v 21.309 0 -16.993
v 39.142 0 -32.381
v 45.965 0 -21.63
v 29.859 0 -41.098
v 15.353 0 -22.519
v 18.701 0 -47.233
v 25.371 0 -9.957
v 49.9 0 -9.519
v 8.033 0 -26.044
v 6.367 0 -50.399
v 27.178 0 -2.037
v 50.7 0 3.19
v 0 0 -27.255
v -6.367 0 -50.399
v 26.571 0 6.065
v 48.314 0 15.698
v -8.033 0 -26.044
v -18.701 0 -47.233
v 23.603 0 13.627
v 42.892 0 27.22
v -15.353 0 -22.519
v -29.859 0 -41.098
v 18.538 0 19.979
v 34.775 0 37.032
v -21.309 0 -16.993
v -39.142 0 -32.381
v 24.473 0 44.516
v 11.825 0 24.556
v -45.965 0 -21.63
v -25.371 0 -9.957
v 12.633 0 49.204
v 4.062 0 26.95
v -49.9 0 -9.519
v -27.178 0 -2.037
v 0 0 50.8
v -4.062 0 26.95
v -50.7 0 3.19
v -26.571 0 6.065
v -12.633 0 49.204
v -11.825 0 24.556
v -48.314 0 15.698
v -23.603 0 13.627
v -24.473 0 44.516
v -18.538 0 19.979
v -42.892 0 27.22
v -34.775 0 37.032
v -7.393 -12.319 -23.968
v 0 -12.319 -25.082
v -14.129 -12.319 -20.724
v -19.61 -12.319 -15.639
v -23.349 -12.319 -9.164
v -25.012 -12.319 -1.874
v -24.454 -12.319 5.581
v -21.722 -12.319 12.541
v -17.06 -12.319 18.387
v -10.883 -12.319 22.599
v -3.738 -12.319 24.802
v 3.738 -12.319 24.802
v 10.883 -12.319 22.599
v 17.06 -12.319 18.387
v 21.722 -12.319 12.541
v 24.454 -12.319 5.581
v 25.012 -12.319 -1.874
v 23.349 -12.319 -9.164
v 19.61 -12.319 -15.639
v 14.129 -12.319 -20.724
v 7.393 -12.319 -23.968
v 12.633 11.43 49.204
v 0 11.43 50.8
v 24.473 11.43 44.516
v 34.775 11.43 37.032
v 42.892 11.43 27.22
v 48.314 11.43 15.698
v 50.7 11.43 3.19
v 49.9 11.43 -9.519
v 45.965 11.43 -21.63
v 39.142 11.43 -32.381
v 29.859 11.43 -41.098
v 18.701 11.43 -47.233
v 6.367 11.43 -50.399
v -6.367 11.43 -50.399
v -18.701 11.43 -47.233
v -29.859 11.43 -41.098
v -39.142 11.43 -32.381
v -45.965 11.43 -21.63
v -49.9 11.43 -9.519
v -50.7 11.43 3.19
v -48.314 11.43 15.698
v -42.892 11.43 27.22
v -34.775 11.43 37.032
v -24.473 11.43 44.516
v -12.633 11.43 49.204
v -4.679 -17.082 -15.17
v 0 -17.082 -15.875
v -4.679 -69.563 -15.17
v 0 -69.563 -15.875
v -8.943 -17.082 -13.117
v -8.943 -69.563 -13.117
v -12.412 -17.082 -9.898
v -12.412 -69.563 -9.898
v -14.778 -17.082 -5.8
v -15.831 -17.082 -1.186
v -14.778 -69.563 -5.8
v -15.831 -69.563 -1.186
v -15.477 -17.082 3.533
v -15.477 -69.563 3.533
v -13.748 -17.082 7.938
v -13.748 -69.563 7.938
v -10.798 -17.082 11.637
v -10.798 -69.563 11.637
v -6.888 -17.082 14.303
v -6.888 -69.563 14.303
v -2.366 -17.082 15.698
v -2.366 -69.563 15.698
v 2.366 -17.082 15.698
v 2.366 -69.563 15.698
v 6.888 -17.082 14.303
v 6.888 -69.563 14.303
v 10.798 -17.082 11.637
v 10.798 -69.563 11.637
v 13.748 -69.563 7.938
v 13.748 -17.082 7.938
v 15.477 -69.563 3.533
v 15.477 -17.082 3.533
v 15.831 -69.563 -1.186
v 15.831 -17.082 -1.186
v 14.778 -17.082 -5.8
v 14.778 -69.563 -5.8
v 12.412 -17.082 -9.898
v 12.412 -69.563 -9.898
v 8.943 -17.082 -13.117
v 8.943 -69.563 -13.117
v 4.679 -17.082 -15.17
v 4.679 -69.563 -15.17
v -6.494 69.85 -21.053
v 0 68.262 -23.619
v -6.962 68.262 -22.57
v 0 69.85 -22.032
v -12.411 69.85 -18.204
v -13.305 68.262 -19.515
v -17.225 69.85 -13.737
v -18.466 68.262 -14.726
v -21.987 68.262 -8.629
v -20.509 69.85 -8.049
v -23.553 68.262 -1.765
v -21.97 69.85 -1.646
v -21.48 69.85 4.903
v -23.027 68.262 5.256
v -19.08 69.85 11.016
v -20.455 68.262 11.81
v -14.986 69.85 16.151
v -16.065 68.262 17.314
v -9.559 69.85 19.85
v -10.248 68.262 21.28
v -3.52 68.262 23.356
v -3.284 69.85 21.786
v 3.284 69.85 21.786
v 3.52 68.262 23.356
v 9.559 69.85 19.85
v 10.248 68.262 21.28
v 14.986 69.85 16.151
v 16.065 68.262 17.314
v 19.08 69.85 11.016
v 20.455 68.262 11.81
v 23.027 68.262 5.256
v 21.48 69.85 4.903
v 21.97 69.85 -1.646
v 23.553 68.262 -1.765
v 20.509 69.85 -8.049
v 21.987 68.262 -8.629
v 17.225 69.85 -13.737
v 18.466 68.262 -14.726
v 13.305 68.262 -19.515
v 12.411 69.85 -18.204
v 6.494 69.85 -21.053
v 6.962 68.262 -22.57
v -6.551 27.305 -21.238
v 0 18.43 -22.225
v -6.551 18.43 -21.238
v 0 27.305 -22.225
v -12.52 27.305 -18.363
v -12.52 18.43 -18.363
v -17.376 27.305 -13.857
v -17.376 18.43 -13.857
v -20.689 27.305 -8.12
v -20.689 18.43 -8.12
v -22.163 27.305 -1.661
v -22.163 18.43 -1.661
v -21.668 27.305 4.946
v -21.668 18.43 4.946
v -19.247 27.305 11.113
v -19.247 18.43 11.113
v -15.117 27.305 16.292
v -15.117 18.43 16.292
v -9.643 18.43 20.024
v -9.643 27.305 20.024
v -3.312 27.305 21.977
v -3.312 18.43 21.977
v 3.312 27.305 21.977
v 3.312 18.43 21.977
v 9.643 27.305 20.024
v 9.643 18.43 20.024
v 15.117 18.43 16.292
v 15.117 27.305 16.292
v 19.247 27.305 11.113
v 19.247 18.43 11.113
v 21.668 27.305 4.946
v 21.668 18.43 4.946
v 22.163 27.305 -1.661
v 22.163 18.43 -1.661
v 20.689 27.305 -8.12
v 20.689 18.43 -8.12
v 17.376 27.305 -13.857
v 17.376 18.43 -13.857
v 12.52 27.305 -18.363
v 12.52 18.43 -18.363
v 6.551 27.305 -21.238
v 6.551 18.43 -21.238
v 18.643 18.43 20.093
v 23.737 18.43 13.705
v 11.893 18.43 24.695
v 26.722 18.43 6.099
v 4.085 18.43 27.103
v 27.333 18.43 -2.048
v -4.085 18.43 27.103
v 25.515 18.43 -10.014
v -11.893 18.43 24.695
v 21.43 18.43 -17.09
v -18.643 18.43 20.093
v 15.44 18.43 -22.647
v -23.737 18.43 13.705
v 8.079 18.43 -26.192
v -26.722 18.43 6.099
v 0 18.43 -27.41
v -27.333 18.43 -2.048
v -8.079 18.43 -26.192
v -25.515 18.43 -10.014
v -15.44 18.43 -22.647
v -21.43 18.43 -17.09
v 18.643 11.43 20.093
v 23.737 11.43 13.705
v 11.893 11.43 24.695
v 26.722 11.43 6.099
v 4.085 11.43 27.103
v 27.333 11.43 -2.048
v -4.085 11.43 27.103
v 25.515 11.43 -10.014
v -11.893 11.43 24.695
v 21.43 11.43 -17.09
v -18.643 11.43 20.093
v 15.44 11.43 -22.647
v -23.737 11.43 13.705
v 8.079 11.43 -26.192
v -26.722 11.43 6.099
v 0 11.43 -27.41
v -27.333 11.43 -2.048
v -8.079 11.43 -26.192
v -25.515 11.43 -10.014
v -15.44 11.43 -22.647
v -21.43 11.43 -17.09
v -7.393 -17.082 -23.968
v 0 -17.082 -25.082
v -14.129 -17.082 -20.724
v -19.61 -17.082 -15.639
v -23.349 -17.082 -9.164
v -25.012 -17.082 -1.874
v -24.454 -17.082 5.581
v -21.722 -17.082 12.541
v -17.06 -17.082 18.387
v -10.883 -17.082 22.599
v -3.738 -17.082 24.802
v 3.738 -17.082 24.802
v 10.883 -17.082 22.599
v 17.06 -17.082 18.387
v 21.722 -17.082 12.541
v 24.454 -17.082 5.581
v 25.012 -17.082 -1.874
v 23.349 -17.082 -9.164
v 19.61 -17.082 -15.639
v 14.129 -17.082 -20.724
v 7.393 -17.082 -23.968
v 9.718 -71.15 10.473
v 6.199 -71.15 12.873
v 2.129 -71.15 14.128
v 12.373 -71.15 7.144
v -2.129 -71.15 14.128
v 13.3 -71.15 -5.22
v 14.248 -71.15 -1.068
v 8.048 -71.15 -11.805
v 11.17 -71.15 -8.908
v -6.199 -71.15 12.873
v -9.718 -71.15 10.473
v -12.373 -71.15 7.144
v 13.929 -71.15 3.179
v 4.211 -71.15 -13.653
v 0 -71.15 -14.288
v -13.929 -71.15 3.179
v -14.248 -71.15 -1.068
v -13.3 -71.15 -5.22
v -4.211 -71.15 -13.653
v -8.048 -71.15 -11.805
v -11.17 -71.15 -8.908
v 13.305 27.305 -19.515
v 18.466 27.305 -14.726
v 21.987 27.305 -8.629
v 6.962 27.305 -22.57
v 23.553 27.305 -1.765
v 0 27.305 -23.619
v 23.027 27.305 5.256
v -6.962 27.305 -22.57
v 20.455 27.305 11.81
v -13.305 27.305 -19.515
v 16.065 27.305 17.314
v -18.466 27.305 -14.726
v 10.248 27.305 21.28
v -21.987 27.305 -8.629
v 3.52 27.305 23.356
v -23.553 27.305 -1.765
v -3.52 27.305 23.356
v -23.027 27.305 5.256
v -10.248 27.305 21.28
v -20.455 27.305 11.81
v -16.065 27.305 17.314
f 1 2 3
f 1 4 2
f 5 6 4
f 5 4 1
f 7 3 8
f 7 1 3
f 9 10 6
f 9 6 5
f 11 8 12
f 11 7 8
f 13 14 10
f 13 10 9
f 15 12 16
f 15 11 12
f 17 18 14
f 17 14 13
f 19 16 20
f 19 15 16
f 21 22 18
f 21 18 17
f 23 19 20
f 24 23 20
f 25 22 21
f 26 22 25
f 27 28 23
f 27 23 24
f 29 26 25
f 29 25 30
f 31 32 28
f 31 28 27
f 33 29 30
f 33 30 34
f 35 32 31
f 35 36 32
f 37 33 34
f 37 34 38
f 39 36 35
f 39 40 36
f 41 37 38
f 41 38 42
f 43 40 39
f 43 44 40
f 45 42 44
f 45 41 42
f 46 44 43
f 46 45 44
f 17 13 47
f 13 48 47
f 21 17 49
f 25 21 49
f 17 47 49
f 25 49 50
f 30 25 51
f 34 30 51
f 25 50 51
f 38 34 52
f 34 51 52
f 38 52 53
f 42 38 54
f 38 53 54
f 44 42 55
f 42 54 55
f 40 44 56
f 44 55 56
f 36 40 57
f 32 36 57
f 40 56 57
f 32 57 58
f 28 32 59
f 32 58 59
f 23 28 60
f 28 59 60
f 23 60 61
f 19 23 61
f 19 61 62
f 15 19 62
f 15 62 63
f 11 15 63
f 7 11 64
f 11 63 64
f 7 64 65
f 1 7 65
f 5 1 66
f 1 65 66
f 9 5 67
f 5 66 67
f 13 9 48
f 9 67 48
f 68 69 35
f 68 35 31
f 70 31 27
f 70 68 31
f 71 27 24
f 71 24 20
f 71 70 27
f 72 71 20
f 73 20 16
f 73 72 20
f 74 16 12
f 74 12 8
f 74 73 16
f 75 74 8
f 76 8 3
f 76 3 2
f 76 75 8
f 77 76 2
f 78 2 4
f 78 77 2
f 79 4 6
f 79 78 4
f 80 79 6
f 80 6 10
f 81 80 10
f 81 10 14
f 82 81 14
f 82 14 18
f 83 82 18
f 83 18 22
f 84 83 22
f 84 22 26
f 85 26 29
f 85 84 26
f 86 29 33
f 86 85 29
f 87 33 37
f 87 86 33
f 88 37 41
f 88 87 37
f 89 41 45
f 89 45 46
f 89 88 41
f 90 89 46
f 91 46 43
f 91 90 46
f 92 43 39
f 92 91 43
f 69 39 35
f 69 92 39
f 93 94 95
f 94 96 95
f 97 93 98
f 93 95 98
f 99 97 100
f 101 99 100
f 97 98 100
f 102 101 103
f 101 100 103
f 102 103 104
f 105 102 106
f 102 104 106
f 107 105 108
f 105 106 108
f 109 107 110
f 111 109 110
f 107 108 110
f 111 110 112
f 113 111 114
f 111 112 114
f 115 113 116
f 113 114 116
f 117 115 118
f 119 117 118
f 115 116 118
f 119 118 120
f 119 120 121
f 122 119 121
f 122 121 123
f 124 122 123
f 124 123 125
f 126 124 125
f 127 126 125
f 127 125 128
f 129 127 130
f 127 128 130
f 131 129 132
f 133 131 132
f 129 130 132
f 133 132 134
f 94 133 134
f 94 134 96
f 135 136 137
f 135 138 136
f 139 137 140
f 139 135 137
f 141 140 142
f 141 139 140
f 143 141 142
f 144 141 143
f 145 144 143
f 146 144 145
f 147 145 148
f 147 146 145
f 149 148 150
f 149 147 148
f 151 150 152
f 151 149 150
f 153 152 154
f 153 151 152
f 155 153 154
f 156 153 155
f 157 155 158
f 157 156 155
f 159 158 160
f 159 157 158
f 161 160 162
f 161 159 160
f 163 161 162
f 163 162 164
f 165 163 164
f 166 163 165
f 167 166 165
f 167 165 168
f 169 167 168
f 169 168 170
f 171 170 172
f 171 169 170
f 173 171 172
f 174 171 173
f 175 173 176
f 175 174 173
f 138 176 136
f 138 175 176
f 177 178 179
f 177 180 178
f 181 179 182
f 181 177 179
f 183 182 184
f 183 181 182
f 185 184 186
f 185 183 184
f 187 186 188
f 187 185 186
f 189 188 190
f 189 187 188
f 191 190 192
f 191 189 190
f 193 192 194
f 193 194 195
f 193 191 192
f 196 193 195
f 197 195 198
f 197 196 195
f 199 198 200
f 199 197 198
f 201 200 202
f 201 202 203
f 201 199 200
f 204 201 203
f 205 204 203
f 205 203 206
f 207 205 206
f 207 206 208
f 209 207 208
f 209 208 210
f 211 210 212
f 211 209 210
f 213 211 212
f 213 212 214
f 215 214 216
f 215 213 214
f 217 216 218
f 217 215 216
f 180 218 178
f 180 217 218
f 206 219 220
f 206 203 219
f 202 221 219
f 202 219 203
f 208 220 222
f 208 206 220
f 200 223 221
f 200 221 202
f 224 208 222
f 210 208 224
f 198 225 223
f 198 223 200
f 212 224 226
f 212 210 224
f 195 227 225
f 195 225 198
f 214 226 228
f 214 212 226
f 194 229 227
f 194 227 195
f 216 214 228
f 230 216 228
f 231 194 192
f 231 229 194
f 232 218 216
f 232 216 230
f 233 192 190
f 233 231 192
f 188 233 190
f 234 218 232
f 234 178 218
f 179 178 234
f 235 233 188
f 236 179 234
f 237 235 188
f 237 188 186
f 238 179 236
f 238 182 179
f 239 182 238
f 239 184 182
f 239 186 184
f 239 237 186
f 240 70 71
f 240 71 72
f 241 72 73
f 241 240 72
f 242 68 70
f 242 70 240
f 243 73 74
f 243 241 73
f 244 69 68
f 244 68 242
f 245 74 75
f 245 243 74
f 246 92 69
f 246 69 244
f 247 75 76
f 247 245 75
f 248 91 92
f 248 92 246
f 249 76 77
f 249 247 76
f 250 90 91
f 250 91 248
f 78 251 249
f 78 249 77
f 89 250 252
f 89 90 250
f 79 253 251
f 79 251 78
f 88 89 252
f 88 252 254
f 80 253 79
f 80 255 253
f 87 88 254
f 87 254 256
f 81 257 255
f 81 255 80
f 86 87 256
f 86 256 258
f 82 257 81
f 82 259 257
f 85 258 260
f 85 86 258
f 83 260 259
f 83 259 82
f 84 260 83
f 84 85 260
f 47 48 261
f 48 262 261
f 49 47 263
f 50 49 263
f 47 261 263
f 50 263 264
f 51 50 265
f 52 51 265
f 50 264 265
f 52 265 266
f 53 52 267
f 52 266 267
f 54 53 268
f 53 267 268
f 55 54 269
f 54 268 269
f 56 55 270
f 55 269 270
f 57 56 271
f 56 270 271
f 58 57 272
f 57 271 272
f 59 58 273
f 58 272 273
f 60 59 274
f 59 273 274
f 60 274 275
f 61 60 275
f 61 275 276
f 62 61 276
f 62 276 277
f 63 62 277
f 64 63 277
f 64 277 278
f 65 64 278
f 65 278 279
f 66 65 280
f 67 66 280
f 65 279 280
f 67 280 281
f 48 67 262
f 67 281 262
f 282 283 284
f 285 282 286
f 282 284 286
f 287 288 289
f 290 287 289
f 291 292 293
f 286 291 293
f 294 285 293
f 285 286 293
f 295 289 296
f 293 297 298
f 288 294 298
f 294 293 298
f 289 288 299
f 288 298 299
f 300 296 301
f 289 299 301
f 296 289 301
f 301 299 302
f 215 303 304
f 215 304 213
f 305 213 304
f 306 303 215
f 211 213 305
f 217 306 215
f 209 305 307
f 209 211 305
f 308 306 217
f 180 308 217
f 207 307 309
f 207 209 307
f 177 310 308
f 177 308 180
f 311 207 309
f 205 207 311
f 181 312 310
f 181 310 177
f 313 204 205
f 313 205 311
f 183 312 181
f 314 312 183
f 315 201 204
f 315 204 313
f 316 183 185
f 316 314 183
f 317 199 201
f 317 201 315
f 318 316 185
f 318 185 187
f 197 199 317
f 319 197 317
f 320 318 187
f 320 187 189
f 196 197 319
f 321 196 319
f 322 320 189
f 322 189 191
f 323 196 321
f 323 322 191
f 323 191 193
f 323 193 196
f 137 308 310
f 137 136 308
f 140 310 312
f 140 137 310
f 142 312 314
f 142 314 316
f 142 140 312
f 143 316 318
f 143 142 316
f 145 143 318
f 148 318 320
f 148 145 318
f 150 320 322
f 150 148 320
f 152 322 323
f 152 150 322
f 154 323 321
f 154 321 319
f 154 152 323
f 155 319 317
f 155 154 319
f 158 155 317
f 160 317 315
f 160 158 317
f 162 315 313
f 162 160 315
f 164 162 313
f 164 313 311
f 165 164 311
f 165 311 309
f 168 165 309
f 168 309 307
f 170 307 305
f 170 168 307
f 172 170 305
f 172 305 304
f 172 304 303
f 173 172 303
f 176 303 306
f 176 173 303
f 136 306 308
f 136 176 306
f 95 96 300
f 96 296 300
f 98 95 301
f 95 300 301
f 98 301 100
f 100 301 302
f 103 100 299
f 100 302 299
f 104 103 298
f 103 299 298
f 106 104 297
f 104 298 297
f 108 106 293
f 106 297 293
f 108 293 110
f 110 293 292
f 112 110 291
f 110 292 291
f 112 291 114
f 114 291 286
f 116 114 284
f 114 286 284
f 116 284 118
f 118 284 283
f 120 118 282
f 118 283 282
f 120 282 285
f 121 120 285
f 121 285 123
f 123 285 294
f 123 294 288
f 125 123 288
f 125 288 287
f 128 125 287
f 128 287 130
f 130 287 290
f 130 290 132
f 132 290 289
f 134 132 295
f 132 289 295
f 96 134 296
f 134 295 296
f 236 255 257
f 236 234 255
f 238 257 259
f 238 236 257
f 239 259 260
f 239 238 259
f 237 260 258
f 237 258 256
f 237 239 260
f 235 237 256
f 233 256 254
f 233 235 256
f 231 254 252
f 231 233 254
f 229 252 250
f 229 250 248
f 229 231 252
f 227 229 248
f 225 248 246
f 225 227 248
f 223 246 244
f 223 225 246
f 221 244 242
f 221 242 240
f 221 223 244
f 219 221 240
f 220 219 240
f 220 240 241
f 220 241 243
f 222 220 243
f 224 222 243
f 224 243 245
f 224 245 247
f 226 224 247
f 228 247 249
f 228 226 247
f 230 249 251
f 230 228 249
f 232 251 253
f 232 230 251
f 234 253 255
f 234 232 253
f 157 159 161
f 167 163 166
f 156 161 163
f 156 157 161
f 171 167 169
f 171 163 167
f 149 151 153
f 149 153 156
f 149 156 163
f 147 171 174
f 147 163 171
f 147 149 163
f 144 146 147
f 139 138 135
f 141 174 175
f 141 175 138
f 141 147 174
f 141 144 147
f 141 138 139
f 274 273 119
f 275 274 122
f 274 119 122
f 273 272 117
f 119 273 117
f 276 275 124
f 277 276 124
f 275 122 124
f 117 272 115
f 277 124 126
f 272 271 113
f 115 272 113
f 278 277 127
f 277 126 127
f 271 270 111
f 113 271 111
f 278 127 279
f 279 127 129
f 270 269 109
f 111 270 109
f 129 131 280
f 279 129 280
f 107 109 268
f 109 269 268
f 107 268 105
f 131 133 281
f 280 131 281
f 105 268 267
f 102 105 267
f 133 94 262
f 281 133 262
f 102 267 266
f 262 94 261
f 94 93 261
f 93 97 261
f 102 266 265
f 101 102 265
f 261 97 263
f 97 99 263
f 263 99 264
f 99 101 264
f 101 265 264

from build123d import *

# Parameters (mm, degrees)
SKETCH16_R         = 52.5
SKETCH16_R_2       = 50.8
CUT_EXTRUDE1_DEPTH = 11.43


with BuildPart() as part:
    # Sketch1 → Bearing Shaft/Flange Support (revolve)
    with BuildSketch(Plane(origin=(0, 0, 0), x_dir=(0, 0, -1), z_dir=(1, 0, 0)), mode=Mode.PRIVATE) as bearing_shaft_flange_support_sk:
        Polygon((0, 0), (-27.254672075, 0), (-25.0825, -12.319), (-25.0825, -17.0815), (-15.875, -17.0815), (-15.875, -69.56298), (-14.2875, -71.15048), (0, -71.15048), align=None)
    revolve(bearing_shaft_flange_support_sk.sketch.rotate(Axis((0, 0, 0), (0, 1, 0)), 180), axis=Axis((0, 0, 0), (0, 1, 0)))

    # Sketch2 → Drive Pin Support (revolve)
    with BuildSketch(Plane(origin=(0, 0, 0), x_dir=(0, 0, -1), z_dir=(1, 0, 0)), mode=Mode.PRIVATE) as drive_pin_support_sk:
        Polygon((0, 0), (-52.5, 0), (-52.5, 11.43), (-27.4096, 11.43), (-27.4096, 18.43), (-22.225, 18.43), (-22.225, 27.305), (-23.61946, 27.305), (-23.61946, 68.2625), (-22.03196, 69.85), (0, 69.85), align=None)
    revolve(drive_pin_support_sk.sketch.rotate(Axis((0, 0, 0), (0, 1, 0)), 180), axis=Axis((0, 0, 0), (0, 1, 0)))

    # Sketch16 → Cut-Extrude1 (cut)
    with BuildSketch(Plane(origin=(0, 11.43, 0), x_dir=(1, 0, 0), z_dir=(0, 1, 0))):
        Circle(SKETCH16_R)
        with Locations(Location((0, 0, 0), (0, 0, 270))):
            Circle(SKETCH16_R_2, mode=Mode.SUBTRACT)
    extrude(amount=-CUT_EXTRUDE1_DEPTH, mode=Mode.SUBTRACT)


solid = part.part
